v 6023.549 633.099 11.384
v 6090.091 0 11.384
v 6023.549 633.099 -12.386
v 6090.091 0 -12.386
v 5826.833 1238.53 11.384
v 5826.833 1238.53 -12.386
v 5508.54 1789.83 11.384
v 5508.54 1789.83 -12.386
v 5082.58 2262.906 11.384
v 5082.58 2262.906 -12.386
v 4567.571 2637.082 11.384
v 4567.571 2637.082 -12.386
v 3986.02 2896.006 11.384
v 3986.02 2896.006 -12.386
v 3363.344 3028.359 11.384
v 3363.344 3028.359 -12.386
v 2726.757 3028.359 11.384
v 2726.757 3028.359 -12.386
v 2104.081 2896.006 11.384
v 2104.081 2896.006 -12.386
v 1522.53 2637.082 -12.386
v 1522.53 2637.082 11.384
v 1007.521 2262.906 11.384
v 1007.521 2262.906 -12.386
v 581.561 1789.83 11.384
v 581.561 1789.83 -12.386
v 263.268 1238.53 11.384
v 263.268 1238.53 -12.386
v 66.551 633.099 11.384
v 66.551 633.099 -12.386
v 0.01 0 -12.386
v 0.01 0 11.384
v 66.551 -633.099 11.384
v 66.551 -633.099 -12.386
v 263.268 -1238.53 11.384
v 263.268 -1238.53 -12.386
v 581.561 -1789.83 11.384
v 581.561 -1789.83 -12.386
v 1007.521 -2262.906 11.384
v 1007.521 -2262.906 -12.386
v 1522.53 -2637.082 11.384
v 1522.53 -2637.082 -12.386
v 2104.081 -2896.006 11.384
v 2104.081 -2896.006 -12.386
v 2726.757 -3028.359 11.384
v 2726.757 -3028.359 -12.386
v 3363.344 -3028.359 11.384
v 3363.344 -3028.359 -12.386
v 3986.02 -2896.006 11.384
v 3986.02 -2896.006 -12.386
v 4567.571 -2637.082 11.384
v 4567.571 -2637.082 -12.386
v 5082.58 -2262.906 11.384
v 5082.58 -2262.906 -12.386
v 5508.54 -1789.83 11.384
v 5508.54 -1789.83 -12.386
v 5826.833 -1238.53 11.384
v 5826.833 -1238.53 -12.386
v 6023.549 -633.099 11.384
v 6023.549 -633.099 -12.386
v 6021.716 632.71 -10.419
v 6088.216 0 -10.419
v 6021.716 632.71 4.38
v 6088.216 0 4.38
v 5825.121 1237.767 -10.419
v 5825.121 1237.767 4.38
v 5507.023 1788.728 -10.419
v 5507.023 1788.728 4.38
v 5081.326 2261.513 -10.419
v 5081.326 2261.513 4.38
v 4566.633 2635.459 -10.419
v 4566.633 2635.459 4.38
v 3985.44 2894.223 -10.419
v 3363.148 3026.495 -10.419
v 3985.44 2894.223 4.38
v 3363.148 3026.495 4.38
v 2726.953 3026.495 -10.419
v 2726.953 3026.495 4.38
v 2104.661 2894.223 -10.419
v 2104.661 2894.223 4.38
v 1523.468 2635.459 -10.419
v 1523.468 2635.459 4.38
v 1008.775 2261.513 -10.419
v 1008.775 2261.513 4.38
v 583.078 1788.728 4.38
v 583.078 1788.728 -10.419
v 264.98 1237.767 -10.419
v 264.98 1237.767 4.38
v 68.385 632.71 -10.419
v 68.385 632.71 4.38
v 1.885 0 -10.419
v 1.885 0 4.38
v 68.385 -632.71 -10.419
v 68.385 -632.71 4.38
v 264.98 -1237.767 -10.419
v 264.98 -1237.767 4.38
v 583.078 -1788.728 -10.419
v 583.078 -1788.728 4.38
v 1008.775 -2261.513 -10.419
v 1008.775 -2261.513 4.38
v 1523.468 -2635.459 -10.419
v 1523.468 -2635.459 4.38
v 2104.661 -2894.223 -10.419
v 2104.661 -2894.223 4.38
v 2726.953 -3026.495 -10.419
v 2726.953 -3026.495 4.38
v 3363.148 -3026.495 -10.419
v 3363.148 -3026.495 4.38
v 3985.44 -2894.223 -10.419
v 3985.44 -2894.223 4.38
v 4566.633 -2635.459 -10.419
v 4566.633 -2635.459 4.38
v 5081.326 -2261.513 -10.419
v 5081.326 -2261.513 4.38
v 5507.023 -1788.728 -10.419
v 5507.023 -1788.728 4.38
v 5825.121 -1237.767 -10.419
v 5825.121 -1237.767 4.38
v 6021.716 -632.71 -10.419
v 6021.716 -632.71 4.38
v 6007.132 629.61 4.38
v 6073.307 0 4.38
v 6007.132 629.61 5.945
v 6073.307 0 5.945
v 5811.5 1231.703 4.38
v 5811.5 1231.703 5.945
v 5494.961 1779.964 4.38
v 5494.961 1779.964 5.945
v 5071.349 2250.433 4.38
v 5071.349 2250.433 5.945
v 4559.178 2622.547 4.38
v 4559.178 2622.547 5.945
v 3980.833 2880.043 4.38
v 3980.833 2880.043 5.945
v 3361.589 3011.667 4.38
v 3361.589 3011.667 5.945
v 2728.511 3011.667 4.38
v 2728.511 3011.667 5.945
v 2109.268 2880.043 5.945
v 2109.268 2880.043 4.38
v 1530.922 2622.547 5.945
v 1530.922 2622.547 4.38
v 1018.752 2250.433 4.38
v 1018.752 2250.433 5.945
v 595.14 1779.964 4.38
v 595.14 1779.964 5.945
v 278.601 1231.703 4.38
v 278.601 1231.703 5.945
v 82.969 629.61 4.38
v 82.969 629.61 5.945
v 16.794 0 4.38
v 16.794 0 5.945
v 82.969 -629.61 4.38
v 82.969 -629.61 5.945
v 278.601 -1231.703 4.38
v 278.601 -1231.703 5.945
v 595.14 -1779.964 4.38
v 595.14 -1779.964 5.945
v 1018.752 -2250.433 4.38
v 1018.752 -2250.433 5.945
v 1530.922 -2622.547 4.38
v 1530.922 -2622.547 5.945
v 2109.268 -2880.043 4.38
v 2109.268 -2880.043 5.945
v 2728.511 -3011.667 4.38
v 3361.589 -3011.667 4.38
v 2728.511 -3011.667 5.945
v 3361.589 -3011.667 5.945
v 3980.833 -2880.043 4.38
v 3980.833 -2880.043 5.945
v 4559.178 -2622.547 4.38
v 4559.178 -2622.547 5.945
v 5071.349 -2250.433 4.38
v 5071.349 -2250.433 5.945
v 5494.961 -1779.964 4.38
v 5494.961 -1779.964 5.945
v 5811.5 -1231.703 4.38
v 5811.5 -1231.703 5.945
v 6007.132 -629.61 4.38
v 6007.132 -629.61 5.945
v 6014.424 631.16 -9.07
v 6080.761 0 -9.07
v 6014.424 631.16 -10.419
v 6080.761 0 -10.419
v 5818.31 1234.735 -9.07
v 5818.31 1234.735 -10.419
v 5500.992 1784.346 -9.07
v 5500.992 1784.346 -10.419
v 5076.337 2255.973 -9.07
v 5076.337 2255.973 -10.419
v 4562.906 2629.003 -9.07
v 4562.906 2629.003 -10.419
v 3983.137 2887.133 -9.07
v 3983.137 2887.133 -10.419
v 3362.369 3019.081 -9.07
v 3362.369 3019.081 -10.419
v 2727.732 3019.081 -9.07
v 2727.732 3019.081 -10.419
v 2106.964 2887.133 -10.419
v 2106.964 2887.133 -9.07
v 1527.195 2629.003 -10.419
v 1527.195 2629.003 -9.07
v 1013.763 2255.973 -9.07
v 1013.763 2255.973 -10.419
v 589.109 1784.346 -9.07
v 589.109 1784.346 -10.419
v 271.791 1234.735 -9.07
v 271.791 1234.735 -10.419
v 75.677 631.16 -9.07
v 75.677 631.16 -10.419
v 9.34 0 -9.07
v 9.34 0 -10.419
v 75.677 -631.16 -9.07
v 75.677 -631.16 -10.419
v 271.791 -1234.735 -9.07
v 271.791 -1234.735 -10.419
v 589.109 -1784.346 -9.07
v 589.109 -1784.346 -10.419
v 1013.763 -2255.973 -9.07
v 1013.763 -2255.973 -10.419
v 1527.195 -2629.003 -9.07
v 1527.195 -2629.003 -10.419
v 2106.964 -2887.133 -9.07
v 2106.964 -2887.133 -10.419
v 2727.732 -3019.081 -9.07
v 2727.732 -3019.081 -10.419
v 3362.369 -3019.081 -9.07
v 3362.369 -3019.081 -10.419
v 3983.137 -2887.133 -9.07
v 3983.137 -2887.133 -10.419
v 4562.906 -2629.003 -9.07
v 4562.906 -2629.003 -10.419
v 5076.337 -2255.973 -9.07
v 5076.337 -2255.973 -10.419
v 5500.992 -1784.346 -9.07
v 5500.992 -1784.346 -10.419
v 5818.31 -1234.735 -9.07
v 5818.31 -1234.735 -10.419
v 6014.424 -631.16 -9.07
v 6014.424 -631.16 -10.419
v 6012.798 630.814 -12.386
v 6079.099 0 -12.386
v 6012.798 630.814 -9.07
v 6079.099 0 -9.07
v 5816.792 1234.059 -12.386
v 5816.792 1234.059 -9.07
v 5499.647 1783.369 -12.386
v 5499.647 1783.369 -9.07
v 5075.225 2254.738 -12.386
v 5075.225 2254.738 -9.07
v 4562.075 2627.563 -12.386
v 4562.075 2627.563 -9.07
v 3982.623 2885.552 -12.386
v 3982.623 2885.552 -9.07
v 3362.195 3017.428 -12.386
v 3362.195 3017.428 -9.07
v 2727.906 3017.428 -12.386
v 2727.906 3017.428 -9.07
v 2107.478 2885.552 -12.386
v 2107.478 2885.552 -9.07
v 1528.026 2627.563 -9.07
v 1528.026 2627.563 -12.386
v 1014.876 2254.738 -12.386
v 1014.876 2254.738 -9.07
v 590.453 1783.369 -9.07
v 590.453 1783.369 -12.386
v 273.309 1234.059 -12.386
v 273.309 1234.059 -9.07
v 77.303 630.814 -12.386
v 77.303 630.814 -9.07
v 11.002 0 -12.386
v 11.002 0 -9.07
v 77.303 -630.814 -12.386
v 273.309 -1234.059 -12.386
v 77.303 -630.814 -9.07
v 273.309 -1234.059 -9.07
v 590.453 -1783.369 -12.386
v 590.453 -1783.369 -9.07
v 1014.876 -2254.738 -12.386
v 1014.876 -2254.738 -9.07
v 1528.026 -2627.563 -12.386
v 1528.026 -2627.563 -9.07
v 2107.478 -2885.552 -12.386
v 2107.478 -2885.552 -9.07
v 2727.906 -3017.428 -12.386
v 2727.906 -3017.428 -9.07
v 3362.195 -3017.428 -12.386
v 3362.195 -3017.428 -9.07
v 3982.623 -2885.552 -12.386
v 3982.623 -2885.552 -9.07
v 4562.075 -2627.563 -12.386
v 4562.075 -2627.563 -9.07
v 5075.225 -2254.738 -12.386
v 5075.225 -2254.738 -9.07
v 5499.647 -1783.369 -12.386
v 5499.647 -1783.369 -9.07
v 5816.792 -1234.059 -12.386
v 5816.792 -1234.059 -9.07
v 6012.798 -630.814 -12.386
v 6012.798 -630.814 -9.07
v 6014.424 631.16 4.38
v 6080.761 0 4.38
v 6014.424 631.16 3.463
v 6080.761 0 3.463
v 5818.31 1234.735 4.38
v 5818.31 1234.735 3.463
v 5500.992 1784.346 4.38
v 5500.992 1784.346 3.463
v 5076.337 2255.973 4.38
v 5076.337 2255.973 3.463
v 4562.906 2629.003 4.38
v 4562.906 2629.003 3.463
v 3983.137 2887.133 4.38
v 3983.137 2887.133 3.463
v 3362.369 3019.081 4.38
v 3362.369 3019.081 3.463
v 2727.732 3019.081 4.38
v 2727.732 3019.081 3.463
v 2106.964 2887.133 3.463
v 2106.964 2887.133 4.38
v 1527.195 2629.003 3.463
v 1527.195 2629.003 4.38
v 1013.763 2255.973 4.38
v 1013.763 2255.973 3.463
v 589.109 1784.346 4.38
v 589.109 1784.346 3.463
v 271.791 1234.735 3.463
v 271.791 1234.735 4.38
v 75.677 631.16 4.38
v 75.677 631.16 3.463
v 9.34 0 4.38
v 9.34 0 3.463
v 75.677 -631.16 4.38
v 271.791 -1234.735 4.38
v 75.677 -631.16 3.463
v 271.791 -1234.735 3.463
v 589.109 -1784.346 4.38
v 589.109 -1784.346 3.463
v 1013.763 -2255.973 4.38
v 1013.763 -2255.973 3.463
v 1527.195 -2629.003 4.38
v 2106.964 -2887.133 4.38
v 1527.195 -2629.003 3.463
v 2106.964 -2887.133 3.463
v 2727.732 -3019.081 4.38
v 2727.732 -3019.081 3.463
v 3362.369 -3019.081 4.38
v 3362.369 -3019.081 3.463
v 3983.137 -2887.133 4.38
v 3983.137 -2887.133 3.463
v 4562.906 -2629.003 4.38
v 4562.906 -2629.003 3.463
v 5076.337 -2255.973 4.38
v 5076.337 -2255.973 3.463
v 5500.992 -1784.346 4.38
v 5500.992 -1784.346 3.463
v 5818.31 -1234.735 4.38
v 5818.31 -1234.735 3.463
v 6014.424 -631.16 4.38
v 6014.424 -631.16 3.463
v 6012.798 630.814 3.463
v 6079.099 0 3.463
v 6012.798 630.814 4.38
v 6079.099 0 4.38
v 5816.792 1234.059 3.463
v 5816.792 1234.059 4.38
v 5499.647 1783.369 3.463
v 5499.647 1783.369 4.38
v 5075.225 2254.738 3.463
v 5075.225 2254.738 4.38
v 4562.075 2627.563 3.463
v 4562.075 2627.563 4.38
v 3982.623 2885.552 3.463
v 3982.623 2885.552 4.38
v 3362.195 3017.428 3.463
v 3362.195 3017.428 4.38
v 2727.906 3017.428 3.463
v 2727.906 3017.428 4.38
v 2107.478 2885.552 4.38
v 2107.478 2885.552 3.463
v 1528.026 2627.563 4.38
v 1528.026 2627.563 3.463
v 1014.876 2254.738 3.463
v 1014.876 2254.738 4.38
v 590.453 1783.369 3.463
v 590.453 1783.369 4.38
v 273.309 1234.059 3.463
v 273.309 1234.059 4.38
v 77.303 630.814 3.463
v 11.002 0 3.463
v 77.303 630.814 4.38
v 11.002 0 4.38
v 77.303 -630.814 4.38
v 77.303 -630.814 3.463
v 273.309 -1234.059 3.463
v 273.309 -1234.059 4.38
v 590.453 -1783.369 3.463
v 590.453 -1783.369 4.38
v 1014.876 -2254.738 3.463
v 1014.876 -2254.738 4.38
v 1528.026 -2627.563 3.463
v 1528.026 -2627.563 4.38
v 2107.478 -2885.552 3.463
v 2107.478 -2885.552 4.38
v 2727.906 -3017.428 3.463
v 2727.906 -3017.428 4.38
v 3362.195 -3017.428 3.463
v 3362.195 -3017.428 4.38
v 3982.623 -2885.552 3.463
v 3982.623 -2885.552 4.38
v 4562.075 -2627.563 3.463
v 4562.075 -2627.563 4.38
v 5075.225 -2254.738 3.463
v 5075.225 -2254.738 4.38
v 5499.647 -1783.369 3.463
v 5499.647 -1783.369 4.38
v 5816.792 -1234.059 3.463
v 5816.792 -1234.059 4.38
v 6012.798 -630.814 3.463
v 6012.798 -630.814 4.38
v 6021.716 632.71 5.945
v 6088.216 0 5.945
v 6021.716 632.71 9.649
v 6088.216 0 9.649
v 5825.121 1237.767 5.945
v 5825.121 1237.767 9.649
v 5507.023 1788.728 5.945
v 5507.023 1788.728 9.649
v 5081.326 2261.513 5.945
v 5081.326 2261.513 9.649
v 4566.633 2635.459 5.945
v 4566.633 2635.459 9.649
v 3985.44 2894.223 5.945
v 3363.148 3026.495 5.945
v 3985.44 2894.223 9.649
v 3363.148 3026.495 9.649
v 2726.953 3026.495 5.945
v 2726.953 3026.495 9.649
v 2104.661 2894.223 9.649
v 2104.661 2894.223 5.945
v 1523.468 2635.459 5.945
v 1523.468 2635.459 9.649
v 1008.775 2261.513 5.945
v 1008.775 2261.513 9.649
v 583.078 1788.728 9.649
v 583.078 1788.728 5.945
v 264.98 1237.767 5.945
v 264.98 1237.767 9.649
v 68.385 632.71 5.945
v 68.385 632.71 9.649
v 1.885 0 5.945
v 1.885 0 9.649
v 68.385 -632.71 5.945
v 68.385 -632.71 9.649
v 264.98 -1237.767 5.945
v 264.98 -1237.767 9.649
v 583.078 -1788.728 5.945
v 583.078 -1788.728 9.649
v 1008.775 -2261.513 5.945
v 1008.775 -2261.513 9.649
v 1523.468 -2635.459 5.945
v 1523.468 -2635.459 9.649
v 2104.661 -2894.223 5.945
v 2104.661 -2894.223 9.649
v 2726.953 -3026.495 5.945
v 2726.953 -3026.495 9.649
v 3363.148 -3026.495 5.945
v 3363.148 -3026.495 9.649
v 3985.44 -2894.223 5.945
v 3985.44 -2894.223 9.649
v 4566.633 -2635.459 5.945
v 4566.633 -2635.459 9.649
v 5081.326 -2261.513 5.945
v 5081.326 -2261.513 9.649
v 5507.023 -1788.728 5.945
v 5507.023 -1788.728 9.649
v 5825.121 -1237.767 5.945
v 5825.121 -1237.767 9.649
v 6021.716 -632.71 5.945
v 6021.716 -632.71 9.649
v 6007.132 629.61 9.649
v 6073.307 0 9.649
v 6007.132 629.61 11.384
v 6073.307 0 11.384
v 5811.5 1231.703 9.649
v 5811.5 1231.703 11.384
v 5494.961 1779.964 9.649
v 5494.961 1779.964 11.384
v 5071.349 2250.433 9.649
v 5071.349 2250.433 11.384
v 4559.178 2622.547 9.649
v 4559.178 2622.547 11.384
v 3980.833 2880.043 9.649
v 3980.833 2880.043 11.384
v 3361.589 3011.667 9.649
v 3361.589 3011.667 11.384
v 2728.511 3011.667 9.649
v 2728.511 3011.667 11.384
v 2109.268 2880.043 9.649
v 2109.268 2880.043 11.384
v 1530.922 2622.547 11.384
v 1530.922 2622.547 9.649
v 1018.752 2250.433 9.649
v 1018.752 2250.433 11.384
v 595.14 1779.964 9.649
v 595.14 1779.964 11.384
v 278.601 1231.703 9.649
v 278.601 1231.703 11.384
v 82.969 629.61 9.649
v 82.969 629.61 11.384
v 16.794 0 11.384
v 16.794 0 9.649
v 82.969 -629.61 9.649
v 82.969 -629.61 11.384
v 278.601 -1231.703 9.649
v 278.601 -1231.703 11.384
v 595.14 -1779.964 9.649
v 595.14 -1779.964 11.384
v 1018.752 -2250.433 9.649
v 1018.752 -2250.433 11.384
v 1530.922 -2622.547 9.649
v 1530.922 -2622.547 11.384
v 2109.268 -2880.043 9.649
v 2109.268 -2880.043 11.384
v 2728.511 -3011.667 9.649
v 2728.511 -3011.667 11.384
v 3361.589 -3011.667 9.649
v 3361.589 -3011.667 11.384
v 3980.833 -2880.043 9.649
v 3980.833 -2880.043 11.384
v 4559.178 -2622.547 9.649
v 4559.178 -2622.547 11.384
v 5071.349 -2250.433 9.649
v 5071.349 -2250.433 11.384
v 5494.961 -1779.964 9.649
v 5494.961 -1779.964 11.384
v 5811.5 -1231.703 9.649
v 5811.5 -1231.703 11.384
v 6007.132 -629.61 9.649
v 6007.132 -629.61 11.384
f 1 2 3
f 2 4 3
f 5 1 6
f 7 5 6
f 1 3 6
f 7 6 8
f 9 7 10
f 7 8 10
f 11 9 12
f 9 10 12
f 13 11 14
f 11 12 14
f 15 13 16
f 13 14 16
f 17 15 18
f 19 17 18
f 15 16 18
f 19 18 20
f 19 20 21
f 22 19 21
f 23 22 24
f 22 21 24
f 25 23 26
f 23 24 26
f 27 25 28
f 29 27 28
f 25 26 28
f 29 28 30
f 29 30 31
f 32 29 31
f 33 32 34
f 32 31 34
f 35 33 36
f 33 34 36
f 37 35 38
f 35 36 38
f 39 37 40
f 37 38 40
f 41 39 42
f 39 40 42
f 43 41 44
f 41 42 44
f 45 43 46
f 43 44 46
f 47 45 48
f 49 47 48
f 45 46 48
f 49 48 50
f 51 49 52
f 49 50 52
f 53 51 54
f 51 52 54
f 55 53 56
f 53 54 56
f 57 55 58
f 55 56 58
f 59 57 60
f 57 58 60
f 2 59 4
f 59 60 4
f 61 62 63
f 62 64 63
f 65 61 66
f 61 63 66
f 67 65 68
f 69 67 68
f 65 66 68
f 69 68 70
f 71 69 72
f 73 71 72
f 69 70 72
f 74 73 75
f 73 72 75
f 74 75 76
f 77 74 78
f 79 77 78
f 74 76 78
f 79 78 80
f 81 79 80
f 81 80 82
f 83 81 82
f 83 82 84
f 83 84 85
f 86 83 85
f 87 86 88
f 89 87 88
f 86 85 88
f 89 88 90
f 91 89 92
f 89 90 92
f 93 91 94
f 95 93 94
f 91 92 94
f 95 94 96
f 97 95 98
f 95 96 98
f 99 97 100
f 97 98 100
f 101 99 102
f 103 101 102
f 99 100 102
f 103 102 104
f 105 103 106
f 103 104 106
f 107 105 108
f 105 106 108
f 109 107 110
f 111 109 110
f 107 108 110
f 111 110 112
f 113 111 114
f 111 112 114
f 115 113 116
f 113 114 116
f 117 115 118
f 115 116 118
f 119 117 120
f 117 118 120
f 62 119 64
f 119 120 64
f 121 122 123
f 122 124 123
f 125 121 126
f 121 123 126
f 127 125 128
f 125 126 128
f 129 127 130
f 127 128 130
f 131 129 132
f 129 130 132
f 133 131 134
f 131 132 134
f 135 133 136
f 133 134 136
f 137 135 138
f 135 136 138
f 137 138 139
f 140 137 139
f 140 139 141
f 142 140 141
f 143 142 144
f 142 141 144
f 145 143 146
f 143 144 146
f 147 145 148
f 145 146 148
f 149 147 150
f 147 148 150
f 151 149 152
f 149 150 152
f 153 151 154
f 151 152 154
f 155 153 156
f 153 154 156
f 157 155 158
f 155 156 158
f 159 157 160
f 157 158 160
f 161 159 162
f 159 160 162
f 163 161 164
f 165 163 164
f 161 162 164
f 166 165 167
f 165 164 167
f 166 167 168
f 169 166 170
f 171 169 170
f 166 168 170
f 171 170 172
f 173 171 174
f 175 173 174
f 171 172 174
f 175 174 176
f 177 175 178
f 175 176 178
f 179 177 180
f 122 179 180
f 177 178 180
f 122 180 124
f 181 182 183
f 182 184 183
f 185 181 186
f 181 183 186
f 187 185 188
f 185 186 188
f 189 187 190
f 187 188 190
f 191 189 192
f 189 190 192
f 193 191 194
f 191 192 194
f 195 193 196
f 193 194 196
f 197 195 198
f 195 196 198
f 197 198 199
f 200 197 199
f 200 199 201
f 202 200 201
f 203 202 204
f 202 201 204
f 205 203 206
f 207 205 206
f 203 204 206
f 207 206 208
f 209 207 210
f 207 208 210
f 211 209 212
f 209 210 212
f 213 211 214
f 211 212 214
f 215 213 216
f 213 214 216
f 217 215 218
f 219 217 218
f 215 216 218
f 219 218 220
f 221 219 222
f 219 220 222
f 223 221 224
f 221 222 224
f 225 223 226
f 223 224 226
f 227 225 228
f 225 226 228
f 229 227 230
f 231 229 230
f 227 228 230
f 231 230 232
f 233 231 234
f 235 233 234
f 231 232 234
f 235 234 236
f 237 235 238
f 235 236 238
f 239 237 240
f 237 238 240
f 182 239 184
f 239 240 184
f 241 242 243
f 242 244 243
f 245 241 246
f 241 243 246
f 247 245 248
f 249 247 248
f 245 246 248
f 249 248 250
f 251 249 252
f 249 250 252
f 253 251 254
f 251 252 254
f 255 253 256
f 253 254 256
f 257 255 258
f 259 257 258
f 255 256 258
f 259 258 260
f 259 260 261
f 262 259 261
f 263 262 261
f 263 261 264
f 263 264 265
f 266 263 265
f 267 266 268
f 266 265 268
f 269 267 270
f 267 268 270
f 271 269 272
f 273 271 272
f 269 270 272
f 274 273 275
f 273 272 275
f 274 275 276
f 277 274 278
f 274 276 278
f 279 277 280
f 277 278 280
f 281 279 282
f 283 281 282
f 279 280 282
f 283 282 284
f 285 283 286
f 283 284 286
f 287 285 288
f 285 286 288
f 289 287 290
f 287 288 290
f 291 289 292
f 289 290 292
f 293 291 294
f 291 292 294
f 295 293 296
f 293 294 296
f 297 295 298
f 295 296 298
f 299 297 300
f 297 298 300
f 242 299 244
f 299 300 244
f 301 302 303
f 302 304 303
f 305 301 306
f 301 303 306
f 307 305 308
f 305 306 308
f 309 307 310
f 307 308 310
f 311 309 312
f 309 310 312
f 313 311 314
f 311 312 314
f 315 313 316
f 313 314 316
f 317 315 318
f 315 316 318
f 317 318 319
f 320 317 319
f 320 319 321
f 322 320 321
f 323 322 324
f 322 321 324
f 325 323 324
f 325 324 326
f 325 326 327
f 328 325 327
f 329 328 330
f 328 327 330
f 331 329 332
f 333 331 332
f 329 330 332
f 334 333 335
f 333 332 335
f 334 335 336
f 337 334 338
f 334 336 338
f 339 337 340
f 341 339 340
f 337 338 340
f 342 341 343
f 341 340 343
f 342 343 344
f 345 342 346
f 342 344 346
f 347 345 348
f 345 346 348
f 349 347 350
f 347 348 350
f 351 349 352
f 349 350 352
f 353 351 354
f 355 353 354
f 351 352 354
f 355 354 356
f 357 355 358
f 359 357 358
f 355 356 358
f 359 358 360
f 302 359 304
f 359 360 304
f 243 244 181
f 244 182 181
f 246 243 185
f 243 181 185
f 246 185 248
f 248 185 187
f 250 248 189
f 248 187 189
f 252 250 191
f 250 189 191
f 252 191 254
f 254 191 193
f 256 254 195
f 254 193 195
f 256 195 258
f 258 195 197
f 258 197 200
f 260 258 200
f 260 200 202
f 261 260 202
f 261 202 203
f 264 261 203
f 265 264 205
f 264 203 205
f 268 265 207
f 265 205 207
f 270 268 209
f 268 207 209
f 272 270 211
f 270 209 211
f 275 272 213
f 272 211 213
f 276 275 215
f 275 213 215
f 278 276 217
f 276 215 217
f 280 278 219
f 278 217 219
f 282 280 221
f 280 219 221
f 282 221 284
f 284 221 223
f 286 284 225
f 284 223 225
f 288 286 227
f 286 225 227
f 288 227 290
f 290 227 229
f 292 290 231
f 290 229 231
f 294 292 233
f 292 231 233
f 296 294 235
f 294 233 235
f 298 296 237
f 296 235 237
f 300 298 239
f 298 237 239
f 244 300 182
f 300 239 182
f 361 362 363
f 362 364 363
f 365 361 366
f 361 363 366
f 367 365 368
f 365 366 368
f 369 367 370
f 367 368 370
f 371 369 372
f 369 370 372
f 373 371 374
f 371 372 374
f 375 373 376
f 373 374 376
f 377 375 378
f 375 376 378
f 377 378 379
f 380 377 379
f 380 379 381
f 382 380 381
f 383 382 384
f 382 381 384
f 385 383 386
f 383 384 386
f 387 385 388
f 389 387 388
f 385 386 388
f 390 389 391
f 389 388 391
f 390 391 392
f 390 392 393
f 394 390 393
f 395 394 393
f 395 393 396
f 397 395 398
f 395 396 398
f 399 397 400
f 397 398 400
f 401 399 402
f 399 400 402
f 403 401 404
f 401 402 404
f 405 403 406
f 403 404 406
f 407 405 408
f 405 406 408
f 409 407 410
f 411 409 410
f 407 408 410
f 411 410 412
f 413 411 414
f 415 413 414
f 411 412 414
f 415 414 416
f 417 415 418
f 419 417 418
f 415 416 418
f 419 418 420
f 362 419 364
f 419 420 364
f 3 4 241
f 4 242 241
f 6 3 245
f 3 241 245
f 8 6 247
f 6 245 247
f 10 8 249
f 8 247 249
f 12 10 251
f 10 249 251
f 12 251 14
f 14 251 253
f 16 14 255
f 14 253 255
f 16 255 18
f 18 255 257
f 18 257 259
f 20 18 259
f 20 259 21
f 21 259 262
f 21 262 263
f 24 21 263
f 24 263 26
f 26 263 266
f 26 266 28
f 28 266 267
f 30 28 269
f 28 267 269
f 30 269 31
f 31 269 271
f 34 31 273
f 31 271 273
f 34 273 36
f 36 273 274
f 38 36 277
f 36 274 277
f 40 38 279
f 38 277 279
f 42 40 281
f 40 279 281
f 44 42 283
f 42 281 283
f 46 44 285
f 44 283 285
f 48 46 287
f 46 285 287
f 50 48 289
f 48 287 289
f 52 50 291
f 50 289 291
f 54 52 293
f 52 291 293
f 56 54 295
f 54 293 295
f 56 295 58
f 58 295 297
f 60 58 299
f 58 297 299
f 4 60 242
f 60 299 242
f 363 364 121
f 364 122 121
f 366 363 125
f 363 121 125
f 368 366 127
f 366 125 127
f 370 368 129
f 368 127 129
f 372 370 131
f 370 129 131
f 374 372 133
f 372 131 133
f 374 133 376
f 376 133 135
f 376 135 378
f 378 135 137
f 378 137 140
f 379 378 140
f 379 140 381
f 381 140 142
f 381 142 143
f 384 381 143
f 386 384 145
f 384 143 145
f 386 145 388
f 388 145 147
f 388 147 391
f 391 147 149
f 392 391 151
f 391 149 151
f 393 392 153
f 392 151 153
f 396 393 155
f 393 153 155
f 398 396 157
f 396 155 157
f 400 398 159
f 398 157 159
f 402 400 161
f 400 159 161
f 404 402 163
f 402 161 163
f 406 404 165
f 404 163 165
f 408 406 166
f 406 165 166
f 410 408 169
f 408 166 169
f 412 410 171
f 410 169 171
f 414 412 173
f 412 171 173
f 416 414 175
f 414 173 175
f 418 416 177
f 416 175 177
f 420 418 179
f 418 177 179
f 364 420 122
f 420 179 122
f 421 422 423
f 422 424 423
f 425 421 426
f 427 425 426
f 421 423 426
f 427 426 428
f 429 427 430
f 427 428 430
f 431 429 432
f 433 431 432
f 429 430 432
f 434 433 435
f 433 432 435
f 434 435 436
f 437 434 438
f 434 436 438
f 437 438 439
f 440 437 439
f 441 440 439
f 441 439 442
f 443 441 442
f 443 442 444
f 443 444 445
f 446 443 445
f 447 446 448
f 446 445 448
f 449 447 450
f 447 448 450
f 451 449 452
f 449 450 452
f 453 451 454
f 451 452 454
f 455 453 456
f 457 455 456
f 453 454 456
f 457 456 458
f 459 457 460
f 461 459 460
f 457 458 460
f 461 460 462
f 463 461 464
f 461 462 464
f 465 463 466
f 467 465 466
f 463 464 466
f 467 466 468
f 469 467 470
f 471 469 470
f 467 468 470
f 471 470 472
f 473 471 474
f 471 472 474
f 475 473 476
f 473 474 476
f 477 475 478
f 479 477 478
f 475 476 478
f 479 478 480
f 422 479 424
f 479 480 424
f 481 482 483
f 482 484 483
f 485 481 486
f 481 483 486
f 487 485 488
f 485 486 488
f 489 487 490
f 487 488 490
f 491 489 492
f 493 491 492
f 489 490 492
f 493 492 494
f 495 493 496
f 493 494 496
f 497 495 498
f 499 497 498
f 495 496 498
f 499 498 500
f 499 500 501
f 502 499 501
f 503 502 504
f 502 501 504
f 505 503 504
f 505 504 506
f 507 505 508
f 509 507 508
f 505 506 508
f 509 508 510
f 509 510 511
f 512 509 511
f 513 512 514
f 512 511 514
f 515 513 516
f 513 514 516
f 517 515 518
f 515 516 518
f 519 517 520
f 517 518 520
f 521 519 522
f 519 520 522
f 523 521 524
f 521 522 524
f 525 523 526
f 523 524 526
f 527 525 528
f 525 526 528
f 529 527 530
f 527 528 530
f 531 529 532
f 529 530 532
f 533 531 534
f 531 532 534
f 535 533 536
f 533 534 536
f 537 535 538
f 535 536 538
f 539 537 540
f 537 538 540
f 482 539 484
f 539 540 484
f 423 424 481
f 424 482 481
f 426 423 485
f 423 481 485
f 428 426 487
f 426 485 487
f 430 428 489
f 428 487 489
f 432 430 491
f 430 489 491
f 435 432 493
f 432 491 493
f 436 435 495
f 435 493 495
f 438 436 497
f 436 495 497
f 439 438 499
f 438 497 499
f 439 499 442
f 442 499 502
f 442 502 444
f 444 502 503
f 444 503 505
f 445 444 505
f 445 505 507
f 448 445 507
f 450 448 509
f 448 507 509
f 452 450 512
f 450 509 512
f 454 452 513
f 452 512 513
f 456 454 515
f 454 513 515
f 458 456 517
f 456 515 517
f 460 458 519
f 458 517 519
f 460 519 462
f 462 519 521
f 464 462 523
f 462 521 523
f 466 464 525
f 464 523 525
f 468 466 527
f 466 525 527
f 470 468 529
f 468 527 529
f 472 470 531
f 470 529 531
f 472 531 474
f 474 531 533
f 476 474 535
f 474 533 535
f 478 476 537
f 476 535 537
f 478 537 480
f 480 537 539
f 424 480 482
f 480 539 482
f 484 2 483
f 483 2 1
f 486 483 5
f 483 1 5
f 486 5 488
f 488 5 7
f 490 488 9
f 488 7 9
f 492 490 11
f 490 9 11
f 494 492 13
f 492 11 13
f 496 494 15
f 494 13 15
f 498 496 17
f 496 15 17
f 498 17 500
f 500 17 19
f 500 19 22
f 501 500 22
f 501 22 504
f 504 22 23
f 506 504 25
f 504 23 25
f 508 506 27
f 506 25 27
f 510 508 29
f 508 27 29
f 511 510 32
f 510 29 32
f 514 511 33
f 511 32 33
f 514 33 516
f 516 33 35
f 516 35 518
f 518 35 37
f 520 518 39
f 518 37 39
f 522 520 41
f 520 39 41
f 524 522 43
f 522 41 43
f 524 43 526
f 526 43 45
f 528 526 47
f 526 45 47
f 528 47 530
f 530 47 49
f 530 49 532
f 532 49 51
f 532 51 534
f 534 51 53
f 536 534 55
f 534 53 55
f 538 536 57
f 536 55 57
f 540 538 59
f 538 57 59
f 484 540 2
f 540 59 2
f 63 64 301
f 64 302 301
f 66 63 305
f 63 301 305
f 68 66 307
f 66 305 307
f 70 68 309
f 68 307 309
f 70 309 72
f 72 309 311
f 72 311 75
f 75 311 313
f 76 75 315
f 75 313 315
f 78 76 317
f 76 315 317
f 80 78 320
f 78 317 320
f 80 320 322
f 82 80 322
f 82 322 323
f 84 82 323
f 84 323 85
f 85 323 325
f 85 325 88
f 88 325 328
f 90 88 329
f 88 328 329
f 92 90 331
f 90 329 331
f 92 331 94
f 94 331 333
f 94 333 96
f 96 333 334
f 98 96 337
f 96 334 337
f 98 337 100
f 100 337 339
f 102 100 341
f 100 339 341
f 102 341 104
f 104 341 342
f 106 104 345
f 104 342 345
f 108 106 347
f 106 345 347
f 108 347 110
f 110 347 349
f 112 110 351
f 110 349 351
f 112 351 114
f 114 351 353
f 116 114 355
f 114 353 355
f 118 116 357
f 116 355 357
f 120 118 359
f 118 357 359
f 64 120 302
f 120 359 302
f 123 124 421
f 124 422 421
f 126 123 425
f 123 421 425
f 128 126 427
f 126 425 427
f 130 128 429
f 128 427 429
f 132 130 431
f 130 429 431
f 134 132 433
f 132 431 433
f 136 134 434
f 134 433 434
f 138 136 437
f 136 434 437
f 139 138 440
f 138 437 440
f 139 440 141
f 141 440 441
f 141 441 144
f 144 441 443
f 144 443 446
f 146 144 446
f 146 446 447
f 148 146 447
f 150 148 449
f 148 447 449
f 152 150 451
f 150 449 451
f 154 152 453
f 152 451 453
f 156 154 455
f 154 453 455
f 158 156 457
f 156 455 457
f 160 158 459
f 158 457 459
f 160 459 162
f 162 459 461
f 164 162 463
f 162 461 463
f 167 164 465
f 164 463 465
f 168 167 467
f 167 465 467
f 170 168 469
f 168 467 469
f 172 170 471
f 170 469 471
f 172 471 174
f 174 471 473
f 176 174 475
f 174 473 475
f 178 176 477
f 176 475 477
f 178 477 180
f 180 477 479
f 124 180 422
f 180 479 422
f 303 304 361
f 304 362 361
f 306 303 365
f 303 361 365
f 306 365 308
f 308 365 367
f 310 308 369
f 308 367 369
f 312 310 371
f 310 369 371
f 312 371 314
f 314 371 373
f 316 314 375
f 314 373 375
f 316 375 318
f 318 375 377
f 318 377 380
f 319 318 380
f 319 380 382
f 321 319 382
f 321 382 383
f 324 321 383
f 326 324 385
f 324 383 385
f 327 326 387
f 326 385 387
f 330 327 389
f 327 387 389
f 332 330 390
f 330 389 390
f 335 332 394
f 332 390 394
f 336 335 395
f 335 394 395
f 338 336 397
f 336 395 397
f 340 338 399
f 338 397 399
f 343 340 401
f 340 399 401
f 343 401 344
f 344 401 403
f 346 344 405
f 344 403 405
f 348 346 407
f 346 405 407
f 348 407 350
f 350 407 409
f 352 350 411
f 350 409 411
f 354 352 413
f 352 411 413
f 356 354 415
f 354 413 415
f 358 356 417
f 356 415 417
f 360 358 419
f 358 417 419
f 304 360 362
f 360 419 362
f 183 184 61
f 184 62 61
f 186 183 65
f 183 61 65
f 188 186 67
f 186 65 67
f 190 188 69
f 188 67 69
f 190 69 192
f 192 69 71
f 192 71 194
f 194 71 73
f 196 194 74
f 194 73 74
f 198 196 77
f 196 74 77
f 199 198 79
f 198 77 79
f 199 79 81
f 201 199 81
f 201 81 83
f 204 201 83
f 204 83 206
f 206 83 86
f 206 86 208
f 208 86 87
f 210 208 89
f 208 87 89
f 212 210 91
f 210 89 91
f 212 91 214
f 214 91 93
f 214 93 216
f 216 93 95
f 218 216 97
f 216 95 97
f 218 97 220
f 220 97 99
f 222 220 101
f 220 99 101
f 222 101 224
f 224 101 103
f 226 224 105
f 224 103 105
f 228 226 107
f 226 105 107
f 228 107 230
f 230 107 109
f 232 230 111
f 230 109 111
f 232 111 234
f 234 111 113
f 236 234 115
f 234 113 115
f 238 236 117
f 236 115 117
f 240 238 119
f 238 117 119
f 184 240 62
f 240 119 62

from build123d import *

# Parameters (mm, degrees)
F3_W     = 1225
F3_H     = 85.465123
F4_DEPTH = 2400


with BuildPart() as f2:
    # F2: sweep along a path in F1
    with BuildLine(Plane.XY) as f2_path:
        CenterArc((3045.050405, 0), 3045, 0, 360)
    # F0 (on Front) → F2 (sweep)
    with BuildSketch(Plane.XZ):
        Polygon((16.794275, 11.384281), (0.01, 11.384281), (0.01, -12.385881), (11.001622, -12.385881), (11.001622, -10.419134), (11.001622, -9.070487), (9.33952, -9.070487), (9.33952, -10.419134), (1.884766, -10.419134), (1.884766, 4.380418), (9.33952, 4.380418), (9.33952, 3.463338), (11.001622, 3.463338), (11.001622, 4.380418), (16.794275, 4.380418), (16.794275, 5.944849), (1.884766, 5.944849), (1.884766, 7.544847), (1.884766, 9.648737), (16.794275, 9.648737), align=None)
    sweep(path=f2_path.line)

    # F3 (on Front) → F4 (cut)
    with BuildSketch(Plane.XZ):
        with Locations((2287.675023, -4.19138)):
            Rectangle(F3_W, F3_H)
    extrude(amount=F4_DEPTH, mode=Mode.SUBTRACT)


solid = f2.part
